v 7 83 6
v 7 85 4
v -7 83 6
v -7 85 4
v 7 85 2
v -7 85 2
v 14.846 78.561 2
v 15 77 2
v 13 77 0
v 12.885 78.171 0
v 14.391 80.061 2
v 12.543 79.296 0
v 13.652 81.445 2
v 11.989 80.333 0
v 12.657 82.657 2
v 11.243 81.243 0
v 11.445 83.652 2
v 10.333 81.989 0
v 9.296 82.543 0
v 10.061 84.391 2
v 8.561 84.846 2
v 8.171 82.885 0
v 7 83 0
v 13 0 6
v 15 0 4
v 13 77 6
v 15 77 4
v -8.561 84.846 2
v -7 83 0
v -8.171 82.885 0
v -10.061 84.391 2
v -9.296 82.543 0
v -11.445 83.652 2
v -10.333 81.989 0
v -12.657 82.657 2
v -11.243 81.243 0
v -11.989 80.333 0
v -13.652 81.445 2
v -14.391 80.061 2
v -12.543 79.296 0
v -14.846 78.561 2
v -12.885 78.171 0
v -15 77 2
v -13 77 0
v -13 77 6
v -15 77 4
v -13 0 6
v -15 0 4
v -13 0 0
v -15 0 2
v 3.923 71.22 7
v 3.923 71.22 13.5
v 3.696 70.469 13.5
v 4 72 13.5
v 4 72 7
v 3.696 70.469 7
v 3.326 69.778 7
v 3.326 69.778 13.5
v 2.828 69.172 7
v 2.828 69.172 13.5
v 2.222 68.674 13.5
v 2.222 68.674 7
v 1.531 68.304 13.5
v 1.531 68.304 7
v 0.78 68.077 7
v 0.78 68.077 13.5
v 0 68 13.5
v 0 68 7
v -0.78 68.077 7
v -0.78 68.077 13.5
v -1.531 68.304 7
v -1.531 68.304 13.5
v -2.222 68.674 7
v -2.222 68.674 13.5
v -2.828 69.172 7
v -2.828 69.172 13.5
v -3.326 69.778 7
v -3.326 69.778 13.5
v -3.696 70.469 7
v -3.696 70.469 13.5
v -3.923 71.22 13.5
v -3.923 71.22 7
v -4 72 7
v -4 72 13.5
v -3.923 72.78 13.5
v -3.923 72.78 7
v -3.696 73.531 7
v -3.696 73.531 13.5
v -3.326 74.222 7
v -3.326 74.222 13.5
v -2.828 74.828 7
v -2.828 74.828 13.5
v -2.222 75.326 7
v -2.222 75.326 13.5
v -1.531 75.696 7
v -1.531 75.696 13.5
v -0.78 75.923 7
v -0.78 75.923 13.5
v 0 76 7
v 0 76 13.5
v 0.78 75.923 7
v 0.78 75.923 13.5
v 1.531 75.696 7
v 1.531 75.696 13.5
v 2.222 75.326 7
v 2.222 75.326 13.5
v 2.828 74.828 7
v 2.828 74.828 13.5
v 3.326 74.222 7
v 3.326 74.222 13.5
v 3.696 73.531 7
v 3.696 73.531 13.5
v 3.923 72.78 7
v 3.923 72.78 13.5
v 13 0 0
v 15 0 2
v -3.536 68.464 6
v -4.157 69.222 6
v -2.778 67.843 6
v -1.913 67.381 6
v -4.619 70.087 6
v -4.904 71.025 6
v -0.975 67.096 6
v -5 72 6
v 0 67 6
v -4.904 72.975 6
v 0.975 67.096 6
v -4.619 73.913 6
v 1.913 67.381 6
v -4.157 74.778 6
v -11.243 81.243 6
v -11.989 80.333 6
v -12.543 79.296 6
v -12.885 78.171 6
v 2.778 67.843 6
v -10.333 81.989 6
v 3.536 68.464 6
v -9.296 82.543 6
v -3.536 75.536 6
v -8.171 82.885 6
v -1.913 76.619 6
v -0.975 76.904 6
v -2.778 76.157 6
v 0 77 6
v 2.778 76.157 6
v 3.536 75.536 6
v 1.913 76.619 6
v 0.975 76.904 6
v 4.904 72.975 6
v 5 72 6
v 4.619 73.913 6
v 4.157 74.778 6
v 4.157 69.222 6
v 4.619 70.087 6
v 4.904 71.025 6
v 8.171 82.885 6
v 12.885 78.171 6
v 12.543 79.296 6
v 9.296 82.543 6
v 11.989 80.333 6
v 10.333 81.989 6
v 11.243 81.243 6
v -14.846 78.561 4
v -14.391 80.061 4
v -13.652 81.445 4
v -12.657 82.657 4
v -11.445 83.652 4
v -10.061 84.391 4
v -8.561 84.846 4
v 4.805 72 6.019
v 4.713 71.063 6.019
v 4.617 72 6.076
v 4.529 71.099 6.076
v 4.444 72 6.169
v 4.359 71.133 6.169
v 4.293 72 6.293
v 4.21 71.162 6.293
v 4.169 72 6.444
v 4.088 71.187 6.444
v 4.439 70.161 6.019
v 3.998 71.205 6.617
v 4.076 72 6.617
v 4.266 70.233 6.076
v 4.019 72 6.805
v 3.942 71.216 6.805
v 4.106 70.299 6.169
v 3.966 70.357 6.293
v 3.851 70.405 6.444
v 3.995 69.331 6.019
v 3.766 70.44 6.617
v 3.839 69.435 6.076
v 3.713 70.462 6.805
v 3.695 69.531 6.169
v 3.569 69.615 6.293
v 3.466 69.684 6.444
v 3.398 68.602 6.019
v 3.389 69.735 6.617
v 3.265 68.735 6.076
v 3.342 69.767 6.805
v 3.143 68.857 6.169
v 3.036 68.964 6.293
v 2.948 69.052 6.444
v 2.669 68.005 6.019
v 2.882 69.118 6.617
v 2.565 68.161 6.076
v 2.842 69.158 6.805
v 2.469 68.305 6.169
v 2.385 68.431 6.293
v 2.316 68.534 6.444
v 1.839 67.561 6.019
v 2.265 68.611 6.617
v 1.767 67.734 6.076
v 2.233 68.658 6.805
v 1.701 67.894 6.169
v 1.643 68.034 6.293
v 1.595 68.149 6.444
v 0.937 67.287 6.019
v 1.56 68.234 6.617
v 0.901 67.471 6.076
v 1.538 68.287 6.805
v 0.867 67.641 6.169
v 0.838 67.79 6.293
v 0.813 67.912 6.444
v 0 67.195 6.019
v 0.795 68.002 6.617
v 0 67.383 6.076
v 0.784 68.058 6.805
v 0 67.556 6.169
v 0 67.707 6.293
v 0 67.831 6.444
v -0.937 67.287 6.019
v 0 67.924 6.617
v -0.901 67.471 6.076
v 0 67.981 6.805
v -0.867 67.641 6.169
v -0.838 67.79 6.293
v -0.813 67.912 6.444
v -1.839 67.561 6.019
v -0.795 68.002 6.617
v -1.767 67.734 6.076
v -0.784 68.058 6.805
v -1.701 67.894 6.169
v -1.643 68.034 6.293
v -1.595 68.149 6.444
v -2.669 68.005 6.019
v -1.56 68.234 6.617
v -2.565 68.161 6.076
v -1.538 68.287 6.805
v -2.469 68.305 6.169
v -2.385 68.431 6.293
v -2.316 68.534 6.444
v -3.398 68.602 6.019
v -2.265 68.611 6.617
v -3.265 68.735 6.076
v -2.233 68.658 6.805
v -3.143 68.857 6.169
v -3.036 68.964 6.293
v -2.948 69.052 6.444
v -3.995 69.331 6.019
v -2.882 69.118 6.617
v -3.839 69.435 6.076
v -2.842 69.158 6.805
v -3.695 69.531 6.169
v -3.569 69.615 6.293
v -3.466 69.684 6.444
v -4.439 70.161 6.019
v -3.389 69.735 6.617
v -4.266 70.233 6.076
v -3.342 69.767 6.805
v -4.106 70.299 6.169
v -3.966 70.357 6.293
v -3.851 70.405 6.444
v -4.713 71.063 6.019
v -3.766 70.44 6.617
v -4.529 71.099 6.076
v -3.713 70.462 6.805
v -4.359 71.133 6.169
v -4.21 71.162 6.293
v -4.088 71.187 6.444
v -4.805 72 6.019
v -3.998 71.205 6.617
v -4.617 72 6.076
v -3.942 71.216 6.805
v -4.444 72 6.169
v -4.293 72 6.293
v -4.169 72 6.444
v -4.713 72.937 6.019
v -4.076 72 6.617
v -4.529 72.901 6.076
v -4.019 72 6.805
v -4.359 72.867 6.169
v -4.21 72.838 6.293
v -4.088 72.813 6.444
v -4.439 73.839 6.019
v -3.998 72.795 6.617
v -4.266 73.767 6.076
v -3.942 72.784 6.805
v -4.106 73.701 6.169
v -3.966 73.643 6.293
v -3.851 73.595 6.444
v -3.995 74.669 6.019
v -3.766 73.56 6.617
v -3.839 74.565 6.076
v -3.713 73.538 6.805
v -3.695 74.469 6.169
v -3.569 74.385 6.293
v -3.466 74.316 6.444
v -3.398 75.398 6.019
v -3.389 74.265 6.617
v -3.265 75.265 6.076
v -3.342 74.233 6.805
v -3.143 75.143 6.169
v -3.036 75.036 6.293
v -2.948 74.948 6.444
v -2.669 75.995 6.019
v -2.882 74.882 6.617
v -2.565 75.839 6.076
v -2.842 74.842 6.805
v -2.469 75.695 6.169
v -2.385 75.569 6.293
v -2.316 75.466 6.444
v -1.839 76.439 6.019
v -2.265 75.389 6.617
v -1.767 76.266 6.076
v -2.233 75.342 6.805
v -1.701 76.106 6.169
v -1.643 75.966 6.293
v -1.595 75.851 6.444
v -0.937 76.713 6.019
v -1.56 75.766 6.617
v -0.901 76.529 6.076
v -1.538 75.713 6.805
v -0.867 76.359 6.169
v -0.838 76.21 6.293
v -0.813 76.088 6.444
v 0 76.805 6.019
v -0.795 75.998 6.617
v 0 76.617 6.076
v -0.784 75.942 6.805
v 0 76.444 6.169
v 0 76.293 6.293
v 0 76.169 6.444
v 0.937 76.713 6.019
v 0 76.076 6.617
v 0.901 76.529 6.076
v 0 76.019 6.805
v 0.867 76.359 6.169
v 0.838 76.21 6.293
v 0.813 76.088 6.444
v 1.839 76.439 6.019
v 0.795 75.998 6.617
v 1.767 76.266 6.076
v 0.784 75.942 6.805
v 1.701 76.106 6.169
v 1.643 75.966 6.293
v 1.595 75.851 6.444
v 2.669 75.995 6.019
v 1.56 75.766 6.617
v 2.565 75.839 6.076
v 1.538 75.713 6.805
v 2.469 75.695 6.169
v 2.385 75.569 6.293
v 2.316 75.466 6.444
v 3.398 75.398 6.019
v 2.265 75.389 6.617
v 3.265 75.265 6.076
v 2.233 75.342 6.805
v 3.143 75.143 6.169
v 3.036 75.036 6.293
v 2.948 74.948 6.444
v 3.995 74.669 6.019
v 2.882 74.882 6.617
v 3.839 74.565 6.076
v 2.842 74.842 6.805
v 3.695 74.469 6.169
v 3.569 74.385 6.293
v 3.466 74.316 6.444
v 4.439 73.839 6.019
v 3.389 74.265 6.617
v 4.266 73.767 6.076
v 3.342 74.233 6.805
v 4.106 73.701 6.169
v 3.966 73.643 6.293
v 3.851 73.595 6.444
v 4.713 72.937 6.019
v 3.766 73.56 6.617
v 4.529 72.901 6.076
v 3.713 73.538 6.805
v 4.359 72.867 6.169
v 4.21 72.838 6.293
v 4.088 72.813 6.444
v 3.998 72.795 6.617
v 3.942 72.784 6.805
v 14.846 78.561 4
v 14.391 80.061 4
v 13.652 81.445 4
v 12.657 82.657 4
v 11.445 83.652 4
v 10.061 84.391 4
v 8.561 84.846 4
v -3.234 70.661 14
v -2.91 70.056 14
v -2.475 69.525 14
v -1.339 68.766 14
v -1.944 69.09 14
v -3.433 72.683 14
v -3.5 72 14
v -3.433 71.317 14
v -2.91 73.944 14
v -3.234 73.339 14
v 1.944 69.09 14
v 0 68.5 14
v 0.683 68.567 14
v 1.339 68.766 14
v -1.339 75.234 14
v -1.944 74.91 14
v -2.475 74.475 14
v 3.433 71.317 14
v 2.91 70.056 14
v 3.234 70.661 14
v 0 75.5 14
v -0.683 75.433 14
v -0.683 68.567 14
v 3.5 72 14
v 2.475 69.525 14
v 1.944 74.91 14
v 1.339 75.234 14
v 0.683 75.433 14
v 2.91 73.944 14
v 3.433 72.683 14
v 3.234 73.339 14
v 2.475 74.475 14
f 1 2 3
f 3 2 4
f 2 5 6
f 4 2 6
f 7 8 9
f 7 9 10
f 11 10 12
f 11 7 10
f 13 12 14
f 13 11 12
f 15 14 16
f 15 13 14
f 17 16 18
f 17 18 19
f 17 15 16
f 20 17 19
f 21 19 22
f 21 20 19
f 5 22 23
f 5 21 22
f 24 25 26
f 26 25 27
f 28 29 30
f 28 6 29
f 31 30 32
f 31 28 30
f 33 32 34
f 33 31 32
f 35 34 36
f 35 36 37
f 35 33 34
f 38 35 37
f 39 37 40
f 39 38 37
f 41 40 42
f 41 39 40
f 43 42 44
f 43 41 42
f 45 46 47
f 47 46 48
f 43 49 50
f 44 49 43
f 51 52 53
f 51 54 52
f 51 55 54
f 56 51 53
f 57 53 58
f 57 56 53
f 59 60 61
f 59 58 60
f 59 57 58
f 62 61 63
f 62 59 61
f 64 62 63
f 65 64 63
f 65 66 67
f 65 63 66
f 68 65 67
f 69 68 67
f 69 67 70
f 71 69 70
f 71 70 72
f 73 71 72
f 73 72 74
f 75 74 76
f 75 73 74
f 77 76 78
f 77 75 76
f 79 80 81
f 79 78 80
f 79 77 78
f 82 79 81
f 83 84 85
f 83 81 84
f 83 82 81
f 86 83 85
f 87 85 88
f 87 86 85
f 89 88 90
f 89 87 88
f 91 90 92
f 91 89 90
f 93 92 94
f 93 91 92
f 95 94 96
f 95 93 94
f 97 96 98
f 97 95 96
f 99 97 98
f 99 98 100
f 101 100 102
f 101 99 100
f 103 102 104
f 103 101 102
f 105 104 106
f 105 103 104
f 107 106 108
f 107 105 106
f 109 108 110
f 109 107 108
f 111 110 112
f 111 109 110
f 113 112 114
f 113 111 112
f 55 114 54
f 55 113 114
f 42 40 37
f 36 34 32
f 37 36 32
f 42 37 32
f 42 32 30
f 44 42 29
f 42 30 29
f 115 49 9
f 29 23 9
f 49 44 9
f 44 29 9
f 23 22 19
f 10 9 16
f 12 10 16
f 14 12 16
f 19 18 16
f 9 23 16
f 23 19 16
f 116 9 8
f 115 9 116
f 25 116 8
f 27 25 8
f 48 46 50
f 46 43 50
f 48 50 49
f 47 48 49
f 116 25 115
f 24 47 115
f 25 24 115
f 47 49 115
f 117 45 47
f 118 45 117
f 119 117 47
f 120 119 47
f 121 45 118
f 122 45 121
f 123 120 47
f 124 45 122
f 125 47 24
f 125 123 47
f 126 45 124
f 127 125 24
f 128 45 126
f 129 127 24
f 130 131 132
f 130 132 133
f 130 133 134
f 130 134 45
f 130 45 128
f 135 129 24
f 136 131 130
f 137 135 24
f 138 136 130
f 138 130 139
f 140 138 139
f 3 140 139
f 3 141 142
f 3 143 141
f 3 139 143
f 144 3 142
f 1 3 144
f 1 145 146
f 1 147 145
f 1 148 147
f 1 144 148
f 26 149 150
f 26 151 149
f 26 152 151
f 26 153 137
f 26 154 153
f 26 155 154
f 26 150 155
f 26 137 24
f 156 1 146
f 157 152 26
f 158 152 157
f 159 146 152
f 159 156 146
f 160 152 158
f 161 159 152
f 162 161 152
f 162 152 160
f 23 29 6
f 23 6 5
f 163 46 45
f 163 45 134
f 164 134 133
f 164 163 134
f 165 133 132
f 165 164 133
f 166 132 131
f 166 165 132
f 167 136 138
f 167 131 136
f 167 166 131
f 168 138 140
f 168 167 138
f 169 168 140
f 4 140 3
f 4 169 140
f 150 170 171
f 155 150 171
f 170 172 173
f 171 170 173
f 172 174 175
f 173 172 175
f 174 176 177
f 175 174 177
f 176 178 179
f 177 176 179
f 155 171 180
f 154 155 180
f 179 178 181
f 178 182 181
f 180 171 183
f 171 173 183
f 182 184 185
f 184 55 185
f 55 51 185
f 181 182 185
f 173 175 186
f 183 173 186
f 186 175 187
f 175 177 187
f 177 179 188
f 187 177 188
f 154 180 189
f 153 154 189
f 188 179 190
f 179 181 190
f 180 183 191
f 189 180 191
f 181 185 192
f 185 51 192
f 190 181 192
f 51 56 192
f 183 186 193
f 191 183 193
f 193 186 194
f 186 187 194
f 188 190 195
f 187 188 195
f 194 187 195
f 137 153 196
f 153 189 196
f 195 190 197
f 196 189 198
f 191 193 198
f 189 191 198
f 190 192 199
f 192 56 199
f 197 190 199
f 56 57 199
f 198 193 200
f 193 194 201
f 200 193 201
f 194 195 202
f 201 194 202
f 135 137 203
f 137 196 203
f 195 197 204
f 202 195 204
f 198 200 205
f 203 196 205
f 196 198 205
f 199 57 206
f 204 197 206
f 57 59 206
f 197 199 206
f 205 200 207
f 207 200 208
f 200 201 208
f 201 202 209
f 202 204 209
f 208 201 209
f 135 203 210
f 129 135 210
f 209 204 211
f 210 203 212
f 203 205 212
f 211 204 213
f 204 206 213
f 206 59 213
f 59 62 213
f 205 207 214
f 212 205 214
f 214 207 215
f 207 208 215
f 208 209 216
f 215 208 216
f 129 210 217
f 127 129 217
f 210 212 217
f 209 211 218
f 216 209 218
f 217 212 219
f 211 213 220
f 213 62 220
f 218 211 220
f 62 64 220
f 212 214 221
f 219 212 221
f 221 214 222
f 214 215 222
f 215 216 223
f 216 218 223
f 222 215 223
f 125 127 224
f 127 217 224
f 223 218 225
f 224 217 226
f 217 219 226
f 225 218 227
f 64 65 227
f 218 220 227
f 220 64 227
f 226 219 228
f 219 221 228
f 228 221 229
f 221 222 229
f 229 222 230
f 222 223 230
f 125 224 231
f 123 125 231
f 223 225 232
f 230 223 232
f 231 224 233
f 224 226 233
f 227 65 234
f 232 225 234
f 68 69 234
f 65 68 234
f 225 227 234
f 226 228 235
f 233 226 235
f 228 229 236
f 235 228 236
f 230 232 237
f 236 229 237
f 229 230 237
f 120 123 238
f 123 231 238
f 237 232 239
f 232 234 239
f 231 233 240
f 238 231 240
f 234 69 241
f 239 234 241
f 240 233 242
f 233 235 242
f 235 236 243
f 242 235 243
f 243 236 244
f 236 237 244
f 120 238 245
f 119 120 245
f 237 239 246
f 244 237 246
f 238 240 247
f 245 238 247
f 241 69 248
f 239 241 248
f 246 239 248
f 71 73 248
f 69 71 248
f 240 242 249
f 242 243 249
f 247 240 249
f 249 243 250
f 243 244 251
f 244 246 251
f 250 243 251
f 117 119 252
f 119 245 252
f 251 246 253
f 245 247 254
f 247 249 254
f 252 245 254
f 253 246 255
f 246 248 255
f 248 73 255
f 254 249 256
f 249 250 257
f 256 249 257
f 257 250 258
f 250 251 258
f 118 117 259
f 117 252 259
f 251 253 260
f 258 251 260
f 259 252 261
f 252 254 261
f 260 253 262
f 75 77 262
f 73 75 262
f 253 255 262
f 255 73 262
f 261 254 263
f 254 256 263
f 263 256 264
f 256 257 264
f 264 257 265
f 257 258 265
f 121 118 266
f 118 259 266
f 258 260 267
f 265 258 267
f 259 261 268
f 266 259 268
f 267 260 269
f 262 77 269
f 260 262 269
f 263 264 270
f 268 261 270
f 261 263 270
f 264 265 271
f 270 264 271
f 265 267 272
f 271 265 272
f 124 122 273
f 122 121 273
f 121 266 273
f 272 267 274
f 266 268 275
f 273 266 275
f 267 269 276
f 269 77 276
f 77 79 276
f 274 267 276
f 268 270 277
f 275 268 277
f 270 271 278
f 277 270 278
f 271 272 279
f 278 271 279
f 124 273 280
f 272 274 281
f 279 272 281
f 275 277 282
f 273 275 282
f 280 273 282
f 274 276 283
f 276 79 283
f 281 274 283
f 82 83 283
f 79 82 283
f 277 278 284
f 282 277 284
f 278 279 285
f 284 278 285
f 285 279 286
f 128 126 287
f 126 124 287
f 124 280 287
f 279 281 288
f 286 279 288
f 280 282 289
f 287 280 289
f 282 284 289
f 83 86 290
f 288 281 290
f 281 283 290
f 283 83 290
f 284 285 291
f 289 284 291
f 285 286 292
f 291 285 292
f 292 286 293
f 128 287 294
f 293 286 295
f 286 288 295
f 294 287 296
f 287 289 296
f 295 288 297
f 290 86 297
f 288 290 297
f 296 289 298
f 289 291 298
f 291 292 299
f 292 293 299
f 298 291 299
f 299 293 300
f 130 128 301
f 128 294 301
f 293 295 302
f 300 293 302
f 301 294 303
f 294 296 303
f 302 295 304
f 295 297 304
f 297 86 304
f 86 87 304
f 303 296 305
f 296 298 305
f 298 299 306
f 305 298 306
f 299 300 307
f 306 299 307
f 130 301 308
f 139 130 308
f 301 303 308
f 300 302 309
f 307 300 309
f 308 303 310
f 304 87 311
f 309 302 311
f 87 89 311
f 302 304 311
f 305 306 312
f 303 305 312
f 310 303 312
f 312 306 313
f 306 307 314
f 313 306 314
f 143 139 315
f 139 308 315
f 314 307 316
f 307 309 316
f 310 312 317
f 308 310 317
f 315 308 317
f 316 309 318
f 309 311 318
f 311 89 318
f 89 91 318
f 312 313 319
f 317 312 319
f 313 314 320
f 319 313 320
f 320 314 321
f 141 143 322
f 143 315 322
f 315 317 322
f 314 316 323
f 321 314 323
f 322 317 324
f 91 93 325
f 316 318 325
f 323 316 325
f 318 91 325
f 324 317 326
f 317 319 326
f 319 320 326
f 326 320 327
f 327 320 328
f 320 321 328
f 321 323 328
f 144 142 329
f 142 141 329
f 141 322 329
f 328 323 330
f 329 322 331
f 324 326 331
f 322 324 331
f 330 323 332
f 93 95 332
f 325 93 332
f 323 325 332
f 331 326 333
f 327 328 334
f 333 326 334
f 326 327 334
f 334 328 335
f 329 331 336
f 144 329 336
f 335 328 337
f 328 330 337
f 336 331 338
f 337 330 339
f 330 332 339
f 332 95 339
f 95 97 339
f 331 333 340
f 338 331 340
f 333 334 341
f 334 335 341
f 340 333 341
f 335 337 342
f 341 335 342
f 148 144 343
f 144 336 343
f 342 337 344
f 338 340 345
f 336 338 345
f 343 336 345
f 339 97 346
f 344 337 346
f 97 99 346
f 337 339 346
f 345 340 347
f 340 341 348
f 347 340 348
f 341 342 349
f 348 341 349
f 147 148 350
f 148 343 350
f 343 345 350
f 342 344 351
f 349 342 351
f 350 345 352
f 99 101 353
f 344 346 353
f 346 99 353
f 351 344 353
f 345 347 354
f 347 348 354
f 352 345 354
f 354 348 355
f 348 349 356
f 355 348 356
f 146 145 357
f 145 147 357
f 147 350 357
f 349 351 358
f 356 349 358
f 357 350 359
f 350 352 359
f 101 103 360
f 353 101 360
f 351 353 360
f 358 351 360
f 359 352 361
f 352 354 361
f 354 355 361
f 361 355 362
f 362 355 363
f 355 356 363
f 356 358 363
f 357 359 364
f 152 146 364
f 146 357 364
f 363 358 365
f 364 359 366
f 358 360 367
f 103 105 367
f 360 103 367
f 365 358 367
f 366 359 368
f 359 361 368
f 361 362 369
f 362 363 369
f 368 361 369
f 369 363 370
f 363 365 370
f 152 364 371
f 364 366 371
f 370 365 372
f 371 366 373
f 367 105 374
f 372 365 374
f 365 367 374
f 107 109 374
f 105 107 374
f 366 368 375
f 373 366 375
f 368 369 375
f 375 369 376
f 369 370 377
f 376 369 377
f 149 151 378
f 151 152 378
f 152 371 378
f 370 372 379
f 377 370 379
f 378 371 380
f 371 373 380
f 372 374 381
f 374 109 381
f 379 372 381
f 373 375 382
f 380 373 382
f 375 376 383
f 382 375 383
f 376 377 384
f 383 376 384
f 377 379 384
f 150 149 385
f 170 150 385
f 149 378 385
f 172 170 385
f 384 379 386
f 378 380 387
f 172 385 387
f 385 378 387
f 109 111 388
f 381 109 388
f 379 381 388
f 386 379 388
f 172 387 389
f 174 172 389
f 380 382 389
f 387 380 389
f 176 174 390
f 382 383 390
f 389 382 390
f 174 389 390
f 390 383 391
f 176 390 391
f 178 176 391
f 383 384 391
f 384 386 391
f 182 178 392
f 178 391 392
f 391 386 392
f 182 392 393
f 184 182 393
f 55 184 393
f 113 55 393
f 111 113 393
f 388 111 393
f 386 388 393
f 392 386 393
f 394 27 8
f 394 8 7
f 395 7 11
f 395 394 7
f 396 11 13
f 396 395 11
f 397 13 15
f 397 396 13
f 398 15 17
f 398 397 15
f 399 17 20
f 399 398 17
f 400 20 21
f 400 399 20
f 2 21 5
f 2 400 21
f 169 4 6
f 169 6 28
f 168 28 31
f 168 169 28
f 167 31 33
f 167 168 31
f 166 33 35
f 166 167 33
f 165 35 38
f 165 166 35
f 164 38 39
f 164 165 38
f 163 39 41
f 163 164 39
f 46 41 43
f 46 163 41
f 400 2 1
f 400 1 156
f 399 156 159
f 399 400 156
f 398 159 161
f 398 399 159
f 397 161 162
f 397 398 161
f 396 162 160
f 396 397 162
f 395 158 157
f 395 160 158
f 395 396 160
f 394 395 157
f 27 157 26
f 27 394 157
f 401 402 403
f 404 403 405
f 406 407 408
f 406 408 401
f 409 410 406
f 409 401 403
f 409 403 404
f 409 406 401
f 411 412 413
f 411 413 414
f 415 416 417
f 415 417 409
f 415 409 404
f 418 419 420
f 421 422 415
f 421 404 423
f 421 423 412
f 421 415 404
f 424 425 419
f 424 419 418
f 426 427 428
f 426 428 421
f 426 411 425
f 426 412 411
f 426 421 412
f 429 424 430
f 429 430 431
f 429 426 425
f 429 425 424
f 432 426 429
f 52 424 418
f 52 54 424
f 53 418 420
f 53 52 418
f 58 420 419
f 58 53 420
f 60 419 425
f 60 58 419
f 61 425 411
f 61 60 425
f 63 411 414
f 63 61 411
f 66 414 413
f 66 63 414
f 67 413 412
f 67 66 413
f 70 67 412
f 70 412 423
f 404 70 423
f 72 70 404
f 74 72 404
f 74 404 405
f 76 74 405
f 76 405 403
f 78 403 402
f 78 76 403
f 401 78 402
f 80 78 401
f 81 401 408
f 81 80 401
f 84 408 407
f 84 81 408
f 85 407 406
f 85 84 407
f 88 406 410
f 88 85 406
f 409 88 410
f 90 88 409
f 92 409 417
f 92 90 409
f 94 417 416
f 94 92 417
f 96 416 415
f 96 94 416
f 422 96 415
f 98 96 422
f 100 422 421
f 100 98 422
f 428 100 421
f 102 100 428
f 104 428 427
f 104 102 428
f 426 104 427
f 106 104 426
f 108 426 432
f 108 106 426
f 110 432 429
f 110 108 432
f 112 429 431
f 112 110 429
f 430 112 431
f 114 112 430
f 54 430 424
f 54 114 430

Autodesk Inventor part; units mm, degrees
ref_plane "YZ Plane" through (0, 0, 0) normal (1, 0, 0) x (0, 1, 0)
ref_plane "XZ Plane" through (0, 0, 0) normal (0, 1, 0) x (-1, 0, 0)
ref_plane "XY Plane" through (0, 0, 0) normal (0, 0, 1) x (1, 0, 0)
sketch "Sketch1" plane through (0, 0, 0) normal (0, 0, 1) x (1, 0, 0)
  line L0 (-15, 0) -> (15, 0)
  line L1 (15, 0) -> (15, 85)
  line L2 (15, 85) -> (-15, 85)
  line L3 (-15, 85) -> (-15, 0)
  point P0 (0, 0)
  dimension "d0" = 30
  dimension "d1" = 85
  dimension "d2" = 15
  dimension "d3" = 85
extrude "Extrusion1" add sketch "Sketch1" along normal blind 6
fillet "Fillet1" radius 8 2 edges at (15, 85, 3) (-15, 85, 3)
sketch "Sketch2" plane through (0, 0, 6) normal (0, 0, 1) x (1, 0, 0)
  circle A0 centre (0, 72) radius 4
  line L0 (-15, 0) -> (15, 0) projected
  point P0 (0, 0)
  dimension "d7" = 72
  dimension "d8" = 8
  dimension "d12" = 0
extrude "Extrusion2" add sketch "Sketch2" along normal blind 8
fillet "Fillet2" radius 1 1 edges at (-4, 72, 6)
chamfer "Chamfer1" distance 0.5 angle 45 1 edges at (-4, 72, 14)
chamfer "Chamfer2" distance 2 angle 45 10 edges at (0, 85, 6) (-12.6569, 82.6569, 6) (-15, 38.5, 6) (12.6569, 82.6569, 6) (15, 38.5, 6) (0, 85, 0) (-12.6569, 82.6569, 0) (-15, 38.5, 0) (12.6569, 82.6569, 0) (15, 38.5, 0)
equation "\"d2\" = 0.5 * d0"
equation "\"d3\" = d1"
equation "\"d8\" = d"
equation "\"d\" = 8"
properties part number "reelTab" material "Steel, Mild"
